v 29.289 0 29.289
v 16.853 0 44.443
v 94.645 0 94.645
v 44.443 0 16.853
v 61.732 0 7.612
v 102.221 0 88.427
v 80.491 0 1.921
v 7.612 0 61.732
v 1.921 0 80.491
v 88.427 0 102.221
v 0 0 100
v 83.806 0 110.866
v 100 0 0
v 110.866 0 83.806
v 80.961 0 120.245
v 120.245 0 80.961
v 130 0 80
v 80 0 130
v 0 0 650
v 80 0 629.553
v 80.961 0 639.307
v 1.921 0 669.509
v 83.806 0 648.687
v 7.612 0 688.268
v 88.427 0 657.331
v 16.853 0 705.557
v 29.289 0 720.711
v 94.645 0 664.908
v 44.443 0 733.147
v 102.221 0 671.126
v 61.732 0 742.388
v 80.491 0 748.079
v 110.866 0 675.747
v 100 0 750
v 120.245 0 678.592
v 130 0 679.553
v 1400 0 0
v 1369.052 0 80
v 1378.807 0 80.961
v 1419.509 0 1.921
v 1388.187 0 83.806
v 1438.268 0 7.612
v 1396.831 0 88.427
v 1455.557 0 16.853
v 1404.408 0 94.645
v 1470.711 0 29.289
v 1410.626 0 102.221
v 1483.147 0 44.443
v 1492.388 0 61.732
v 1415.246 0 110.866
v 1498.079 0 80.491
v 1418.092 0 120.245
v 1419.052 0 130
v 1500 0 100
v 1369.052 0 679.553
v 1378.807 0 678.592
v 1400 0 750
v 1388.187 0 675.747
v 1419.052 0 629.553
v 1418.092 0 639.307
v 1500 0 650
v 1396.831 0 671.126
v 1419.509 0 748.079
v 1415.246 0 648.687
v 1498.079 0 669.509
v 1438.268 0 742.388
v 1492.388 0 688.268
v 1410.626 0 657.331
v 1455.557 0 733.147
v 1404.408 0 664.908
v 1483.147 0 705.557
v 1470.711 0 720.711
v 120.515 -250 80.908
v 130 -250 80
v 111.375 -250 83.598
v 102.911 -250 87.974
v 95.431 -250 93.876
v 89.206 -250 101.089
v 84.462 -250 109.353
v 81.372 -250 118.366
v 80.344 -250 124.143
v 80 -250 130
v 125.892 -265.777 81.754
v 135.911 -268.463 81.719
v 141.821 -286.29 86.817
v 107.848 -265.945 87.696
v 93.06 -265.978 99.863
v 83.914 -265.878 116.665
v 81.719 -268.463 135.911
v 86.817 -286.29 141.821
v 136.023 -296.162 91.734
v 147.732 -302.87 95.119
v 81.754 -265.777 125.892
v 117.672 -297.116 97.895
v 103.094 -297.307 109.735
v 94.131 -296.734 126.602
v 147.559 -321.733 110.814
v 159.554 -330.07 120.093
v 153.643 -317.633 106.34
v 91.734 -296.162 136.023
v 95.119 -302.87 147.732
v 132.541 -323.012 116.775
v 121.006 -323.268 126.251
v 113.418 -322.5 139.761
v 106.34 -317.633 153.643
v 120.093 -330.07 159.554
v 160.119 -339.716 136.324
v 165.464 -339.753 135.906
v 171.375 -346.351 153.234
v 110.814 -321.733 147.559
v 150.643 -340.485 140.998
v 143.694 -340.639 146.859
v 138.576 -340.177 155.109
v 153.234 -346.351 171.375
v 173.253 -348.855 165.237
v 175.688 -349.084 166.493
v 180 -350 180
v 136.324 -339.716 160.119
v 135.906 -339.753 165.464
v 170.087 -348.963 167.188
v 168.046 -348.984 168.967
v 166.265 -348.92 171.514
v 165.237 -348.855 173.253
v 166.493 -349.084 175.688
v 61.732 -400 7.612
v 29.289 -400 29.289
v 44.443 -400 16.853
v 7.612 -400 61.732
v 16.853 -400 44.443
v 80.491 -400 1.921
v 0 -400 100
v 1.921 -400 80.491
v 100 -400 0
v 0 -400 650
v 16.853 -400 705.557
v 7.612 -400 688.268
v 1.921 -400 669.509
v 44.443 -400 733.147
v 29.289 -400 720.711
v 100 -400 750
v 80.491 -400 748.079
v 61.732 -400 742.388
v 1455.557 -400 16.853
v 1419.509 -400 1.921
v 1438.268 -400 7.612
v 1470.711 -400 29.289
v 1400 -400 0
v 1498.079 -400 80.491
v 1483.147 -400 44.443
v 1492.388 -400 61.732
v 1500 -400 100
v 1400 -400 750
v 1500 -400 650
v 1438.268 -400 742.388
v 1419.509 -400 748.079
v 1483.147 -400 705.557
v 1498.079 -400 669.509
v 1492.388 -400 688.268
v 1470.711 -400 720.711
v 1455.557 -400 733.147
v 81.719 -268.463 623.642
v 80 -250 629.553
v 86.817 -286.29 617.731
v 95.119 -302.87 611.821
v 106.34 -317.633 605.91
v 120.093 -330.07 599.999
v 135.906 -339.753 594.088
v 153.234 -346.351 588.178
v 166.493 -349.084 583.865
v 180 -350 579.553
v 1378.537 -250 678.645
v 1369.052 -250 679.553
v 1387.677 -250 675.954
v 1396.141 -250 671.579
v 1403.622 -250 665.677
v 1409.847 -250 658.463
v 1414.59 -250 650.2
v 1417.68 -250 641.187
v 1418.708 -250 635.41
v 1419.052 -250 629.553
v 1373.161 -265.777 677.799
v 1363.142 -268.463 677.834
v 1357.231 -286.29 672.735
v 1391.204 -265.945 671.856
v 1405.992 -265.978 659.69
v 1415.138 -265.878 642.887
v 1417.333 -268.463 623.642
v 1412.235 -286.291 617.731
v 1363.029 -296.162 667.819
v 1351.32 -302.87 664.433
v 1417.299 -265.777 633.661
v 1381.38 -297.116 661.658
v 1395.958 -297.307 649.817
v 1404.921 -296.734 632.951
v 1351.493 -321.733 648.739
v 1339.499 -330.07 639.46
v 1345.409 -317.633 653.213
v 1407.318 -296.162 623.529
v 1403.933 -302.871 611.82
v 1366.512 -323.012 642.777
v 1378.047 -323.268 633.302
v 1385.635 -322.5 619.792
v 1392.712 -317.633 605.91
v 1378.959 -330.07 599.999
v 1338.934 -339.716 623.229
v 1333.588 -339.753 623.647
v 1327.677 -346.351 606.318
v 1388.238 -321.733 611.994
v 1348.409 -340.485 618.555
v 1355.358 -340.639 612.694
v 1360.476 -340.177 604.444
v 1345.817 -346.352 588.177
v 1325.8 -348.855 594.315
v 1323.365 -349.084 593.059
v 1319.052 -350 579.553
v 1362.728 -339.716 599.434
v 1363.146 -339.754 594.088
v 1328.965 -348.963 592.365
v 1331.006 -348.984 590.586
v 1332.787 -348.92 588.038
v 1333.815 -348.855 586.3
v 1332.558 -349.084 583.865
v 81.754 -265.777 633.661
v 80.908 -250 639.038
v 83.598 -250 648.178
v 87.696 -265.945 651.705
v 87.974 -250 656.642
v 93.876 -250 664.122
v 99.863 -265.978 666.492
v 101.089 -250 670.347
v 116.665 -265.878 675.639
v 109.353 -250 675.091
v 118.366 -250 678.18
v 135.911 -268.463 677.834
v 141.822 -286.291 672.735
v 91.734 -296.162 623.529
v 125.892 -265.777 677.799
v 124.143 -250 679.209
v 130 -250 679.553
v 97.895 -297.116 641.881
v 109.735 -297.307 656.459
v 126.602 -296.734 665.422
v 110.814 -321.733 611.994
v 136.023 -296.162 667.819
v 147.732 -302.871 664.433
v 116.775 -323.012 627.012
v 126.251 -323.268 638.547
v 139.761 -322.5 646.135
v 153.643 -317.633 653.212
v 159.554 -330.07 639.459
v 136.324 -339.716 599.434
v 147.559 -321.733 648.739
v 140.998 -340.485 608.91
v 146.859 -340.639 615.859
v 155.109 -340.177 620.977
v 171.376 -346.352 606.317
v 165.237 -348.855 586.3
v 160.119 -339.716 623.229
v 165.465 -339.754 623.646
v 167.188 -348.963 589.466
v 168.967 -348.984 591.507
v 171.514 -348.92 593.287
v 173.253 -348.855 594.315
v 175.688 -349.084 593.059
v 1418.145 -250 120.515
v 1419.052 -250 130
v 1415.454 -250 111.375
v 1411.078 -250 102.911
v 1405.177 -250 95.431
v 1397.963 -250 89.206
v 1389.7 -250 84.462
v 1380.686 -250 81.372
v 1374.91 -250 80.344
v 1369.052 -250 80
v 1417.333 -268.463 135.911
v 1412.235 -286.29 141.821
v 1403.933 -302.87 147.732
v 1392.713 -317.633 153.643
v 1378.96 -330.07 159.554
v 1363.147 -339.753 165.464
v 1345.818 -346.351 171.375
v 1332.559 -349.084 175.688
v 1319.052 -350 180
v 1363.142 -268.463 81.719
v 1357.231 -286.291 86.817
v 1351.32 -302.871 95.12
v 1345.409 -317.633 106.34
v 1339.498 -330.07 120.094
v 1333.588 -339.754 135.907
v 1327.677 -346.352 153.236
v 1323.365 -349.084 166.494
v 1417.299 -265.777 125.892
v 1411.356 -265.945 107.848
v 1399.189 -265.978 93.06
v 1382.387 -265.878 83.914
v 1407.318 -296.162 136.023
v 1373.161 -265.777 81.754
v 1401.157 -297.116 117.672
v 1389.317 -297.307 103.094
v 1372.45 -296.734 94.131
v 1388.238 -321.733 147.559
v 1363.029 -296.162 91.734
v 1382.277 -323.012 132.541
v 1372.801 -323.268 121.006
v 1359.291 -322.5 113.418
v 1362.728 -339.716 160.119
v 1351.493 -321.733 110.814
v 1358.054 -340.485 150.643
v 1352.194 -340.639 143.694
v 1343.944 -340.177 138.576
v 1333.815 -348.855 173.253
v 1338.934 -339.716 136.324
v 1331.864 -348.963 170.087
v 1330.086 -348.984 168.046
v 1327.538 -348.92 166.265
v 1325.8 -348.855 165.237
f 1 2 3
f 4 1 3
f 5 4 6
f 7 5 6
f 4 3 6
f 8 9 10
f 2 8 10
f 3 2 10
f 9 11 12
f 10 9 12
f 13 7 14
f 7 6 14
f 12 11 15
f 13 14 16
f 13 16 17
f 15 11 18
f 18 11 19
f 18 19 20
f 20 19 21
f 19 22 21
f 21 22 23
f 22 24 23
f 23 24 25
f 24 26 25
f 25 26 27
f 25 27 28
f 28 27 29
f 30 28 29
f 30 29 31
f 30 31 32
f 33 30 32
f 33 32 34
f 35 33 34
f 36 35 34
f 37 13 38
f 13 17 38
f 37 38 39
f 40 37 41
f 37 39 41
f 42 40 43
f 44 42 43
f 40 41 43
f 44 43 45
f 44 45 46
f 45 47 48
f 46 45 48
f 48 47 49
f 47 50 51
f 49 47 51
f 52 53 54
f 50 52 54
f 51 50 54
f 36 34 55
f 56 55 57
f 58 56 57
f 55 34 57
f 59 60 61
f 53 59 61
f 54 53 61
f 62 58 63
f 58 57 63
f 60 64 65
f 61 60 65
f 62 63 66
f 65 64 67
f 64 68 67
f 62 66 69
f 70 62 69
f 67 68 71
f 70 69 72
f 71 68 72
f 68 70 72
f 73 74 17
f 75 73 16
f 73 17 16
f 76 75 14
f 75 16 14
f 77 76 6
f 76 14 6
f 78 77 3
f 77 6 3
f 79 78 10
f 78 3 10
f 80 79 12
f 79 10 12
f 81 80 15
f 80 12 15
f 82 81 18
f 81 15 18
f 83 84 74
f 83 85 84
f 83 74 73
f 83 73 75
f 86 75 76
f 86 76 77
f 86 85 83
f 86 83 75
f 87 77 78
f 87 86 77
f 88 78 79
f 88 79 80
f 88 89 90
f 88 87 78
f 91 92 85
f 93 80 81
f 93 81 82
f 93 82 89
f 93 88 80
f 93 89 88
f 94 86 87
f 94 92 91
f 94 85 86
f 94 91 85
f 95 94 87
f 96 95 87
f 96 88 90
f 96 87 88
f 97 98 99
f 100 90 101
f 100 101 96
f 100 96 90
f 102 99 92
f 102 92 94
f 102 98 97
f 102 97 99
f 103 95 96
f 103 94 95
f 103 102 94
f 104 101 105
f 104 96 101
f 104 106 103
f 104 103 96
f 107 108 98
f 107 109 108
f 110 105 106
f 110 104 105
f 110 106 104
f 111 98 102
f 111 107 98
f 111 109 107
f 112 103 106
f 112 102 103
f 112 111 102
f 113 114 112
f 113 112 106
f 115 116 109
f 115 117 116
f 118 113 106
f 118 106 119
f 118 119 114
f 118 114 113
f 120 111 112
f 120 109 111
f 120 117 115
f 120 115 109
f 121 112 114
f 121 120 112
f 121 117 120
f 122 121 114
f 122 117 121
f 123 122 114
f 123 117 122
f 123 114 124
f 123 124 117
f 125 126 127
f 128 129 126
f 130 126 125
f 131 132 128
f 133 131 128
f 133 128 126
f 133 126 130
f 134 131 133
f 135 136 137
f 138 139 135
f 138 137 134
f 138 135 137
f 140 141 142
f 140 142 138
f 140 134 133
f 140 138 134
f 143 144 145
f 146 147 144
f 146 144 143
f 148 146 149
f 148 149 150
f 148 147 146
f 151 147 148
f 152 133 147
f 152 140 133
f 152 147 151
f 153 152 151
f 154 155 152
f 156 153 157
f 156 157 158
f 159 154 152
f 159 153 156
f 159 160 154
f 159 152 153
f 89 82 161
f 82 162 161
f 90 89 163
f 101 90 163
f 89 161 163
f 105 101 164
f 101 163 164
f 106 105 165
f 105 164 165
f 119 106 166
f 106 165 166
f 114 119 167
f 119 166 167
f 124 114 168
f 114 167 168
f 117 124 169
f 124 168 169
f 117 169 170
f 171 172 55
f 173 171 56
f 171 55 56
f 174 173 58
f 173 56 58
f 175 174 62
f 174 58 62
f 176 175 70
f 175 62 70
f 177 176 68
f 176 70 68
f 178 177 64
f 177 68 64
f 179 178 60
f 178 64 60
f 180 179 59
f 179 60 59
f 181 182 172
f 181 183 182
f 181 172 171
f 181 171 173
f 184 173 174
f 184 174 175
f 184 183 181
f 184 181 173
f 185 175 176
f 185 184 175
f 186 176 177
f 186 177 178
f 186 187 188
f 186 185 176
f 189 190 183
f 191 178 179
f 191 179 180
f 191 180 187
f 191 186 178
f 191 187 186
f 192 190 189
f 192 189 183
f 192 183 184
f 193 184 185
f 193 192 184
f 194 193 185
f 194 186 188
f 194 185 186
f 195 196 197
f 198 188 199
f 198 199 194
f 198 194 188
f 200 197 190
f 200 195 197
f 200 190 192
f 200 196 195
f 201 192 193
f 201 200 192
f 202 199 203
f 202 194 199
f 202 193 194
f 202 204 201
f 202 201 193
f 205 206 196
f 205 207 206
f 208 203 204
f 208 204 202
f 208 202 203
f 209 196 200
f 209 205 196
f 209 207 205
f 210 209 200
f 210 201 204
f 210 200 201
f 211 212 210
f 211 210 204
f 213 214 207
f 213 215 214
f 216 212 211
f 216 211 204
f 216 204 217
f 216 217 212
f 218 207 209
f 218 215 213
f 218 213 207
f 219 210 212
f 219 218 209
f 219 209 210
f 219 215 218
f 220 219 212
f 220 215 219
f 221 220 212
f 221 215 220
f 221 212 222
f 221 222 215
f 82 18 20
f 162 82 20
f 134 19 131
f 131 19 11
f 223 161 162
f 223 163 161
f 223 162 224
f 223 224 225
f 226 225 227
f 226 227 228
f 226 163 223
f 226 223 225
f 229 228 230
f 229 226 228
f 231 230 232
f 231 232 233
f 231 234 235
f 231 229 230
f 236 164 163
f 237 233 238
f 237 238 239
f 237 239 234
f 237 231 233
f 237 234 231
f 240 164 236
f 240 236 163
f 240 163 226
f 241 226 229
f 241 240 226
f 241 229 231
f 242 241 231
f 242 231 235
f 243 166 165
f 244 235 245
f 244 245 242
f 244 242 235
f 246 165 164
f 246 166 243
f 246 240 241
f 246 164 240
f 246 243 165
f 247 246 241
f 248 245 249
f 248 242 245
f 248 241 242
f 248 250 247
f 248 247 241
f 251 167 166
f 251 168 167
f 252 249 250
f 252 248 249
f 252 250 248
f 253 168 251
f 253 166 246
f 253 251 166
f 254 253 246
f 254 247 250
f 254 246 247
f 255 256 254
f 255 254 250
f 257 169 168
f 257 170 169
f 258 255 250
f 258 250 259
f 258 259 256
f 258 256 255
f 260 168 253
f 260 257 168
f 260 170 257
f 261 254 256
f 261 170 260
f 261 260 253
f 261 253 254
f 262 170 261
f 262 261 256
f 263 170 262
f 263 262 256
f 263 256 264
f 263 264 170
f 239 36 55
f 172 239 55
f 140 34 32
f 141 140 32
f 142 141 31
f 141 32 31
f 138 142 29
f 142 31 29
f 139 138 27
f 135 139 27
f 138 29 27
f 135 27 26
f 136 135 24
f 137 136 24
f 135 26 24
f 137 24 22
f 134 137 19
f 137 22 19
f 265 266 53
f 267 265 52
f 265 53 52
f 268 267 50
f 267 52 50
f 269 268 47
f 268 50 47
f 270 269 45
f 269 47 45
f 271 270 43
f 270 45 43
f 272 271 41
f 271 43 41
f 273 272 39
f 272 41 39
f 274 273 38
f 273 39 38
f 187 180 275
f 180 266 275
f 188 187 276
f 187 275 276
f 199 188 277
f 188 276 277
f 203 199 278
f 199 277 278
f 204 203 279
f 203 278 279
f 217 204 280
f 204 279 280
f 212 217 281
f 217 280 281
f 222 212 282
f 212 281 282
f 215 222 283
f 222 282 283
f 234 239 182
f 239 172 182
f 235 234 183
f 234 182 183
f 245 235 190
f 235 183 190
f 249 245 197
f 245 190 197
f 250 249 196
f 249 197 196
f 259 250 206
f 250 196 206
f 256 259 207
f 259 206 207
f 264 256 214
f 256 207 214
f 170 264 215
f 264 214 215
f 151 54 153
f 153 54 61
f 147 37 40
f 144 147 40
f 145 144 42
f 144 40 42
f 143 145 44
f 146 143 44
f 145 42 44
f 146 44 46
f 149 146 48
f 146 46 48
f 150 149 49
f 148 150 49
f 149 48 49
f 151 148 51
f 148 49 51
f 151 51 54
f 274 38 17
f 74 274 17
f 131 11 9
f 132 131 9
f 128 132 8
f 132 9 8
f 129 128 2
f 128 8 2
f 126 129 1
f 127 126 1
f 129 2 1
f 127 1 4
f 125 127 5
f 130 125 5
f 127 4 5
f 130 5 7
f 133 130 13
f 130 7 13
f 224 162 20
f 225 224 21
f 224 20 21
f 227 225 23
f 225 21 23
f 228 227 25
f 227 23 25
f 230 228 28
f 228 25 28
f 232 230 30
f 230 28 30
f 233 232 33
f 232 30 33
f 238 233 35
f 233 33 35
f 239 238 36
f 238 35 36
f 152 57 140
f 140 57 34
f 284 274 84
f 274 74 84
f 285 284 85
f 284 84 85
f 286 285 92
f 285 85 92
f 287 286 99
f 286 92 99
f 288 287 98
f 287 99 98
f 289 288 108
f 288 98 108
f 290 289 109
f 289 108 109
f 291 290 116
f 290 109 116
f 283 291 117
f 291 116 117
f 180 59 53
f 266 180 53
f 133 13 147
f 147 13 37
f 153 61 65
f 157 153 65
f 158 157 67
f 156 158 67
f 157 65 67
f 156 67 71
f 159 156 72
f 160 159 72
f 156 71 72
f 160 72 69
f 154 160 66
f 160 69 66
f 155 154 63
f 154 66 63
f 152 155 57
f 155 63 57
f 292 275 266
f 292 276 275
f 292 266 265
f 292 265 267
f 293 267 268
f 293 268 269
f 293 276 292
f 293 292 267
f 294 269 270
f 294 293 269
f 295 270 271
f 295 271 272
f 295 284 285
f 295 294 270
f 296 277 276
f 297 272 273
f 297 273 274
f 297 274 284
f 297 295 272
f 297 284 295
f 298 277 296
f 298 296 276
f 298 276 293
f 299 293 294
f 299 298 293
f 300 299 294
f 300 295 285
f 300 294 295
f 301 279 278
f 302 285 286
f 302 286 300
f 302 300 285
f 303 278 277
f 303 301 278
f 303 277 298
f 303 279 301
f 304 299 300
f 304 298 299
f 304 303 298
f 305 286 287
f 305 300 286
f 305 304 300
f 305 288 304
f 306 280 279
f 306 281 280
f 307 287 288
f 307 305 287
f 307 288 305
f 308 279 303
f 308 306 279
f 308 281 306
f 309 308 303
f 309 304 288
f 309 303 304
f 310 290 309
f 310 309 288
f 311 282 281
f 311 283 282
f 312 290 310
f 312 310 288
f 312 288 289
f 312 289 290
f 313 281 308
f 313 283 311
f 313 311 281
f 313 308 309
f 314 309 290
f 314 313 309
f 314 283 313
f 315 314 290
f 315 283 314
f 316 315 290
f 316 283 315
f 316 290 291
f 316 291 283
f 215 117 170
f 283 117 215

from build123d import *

# Parameters (mm, degrees)
PAD_DEPTH    = 400
POCKET_DEPTH = 350
FILLET_R     = 100


with BuildPart() as part:
    # Sketch → Pad (new body)
    with BuildSketch(Plane.XZ):
        with BuildLine():
            Line((100, 0), (1400, 0))
            ThreePointArc((1400, 0), (1470.710678, 29.289322), (1500, 100))
            Line((1500, 100), (1500, 650))
            ThreePointArc((1500, 650), (1470.710678, 720.710678), (1400, 750))
            Line((1400, 750), (100, 750))
            ThreePointArc((100, 750), (29.289322, 720.710678), (0, 650))
            Line((0, 650), (0, 100))
            ThreePointArc((0, 100), (29.289322, 29.289322), (100, 0))
        make_face()
    extrude(amount=PAD_DEPTH)

    # Sketch001 (on Face9 of Pad) → Pocket (cut)
    with BuildSketch(Plane(origin=(0, 0, 0), x_dir=(1, 0, 0), z_dir=(0, 1, 0))):
        with BuildLine():
            Line((80, -130), (80, -629.552775))
            ThreePointArc((80, -629.552775), (94.644661, -664.908114), (130, -679.552775))
            Line((130, -679.552775), (1369.052368, -679.552775))
            ThreePointArc((1369.052368, -679.552775), (1404.407707, -664.908114), (1419.052368, -629.552775))
            Line((1419.052368, -629.552775), (1419.052368, -130))
            ThreePointArc((1419.052368, -130), (1404.407707, -94.644661), (1369.052368, -80))
            Line((1369.052368, -80), (130, -80))
            ThreePointArc((130, -80), (94.644661, -94.644661), (80, -130))
        make_face()
    extrude(amount=-POCKET_DEPTH, mode=Mode.SUBTRACT)

    # Fillet
    fillet_edges = [part.edges().sort_by_distance(p)[0] for p in [
        (80, -350, 379.776388),
        (94.644661, -350, 664.908114),
        (749.526184, -350, 679.552775),
        (1404.407707, -350, 664.908114),
        (1419.052368, -350, 379.776388),
        (1404.407707, -350, 94.644661),
        (749.526184, -350, 80),
        (94.644661, -350, 94.644661),
    ]]
    fillet(fillet_edges, radius=FILLET_R)


solid = part.part
